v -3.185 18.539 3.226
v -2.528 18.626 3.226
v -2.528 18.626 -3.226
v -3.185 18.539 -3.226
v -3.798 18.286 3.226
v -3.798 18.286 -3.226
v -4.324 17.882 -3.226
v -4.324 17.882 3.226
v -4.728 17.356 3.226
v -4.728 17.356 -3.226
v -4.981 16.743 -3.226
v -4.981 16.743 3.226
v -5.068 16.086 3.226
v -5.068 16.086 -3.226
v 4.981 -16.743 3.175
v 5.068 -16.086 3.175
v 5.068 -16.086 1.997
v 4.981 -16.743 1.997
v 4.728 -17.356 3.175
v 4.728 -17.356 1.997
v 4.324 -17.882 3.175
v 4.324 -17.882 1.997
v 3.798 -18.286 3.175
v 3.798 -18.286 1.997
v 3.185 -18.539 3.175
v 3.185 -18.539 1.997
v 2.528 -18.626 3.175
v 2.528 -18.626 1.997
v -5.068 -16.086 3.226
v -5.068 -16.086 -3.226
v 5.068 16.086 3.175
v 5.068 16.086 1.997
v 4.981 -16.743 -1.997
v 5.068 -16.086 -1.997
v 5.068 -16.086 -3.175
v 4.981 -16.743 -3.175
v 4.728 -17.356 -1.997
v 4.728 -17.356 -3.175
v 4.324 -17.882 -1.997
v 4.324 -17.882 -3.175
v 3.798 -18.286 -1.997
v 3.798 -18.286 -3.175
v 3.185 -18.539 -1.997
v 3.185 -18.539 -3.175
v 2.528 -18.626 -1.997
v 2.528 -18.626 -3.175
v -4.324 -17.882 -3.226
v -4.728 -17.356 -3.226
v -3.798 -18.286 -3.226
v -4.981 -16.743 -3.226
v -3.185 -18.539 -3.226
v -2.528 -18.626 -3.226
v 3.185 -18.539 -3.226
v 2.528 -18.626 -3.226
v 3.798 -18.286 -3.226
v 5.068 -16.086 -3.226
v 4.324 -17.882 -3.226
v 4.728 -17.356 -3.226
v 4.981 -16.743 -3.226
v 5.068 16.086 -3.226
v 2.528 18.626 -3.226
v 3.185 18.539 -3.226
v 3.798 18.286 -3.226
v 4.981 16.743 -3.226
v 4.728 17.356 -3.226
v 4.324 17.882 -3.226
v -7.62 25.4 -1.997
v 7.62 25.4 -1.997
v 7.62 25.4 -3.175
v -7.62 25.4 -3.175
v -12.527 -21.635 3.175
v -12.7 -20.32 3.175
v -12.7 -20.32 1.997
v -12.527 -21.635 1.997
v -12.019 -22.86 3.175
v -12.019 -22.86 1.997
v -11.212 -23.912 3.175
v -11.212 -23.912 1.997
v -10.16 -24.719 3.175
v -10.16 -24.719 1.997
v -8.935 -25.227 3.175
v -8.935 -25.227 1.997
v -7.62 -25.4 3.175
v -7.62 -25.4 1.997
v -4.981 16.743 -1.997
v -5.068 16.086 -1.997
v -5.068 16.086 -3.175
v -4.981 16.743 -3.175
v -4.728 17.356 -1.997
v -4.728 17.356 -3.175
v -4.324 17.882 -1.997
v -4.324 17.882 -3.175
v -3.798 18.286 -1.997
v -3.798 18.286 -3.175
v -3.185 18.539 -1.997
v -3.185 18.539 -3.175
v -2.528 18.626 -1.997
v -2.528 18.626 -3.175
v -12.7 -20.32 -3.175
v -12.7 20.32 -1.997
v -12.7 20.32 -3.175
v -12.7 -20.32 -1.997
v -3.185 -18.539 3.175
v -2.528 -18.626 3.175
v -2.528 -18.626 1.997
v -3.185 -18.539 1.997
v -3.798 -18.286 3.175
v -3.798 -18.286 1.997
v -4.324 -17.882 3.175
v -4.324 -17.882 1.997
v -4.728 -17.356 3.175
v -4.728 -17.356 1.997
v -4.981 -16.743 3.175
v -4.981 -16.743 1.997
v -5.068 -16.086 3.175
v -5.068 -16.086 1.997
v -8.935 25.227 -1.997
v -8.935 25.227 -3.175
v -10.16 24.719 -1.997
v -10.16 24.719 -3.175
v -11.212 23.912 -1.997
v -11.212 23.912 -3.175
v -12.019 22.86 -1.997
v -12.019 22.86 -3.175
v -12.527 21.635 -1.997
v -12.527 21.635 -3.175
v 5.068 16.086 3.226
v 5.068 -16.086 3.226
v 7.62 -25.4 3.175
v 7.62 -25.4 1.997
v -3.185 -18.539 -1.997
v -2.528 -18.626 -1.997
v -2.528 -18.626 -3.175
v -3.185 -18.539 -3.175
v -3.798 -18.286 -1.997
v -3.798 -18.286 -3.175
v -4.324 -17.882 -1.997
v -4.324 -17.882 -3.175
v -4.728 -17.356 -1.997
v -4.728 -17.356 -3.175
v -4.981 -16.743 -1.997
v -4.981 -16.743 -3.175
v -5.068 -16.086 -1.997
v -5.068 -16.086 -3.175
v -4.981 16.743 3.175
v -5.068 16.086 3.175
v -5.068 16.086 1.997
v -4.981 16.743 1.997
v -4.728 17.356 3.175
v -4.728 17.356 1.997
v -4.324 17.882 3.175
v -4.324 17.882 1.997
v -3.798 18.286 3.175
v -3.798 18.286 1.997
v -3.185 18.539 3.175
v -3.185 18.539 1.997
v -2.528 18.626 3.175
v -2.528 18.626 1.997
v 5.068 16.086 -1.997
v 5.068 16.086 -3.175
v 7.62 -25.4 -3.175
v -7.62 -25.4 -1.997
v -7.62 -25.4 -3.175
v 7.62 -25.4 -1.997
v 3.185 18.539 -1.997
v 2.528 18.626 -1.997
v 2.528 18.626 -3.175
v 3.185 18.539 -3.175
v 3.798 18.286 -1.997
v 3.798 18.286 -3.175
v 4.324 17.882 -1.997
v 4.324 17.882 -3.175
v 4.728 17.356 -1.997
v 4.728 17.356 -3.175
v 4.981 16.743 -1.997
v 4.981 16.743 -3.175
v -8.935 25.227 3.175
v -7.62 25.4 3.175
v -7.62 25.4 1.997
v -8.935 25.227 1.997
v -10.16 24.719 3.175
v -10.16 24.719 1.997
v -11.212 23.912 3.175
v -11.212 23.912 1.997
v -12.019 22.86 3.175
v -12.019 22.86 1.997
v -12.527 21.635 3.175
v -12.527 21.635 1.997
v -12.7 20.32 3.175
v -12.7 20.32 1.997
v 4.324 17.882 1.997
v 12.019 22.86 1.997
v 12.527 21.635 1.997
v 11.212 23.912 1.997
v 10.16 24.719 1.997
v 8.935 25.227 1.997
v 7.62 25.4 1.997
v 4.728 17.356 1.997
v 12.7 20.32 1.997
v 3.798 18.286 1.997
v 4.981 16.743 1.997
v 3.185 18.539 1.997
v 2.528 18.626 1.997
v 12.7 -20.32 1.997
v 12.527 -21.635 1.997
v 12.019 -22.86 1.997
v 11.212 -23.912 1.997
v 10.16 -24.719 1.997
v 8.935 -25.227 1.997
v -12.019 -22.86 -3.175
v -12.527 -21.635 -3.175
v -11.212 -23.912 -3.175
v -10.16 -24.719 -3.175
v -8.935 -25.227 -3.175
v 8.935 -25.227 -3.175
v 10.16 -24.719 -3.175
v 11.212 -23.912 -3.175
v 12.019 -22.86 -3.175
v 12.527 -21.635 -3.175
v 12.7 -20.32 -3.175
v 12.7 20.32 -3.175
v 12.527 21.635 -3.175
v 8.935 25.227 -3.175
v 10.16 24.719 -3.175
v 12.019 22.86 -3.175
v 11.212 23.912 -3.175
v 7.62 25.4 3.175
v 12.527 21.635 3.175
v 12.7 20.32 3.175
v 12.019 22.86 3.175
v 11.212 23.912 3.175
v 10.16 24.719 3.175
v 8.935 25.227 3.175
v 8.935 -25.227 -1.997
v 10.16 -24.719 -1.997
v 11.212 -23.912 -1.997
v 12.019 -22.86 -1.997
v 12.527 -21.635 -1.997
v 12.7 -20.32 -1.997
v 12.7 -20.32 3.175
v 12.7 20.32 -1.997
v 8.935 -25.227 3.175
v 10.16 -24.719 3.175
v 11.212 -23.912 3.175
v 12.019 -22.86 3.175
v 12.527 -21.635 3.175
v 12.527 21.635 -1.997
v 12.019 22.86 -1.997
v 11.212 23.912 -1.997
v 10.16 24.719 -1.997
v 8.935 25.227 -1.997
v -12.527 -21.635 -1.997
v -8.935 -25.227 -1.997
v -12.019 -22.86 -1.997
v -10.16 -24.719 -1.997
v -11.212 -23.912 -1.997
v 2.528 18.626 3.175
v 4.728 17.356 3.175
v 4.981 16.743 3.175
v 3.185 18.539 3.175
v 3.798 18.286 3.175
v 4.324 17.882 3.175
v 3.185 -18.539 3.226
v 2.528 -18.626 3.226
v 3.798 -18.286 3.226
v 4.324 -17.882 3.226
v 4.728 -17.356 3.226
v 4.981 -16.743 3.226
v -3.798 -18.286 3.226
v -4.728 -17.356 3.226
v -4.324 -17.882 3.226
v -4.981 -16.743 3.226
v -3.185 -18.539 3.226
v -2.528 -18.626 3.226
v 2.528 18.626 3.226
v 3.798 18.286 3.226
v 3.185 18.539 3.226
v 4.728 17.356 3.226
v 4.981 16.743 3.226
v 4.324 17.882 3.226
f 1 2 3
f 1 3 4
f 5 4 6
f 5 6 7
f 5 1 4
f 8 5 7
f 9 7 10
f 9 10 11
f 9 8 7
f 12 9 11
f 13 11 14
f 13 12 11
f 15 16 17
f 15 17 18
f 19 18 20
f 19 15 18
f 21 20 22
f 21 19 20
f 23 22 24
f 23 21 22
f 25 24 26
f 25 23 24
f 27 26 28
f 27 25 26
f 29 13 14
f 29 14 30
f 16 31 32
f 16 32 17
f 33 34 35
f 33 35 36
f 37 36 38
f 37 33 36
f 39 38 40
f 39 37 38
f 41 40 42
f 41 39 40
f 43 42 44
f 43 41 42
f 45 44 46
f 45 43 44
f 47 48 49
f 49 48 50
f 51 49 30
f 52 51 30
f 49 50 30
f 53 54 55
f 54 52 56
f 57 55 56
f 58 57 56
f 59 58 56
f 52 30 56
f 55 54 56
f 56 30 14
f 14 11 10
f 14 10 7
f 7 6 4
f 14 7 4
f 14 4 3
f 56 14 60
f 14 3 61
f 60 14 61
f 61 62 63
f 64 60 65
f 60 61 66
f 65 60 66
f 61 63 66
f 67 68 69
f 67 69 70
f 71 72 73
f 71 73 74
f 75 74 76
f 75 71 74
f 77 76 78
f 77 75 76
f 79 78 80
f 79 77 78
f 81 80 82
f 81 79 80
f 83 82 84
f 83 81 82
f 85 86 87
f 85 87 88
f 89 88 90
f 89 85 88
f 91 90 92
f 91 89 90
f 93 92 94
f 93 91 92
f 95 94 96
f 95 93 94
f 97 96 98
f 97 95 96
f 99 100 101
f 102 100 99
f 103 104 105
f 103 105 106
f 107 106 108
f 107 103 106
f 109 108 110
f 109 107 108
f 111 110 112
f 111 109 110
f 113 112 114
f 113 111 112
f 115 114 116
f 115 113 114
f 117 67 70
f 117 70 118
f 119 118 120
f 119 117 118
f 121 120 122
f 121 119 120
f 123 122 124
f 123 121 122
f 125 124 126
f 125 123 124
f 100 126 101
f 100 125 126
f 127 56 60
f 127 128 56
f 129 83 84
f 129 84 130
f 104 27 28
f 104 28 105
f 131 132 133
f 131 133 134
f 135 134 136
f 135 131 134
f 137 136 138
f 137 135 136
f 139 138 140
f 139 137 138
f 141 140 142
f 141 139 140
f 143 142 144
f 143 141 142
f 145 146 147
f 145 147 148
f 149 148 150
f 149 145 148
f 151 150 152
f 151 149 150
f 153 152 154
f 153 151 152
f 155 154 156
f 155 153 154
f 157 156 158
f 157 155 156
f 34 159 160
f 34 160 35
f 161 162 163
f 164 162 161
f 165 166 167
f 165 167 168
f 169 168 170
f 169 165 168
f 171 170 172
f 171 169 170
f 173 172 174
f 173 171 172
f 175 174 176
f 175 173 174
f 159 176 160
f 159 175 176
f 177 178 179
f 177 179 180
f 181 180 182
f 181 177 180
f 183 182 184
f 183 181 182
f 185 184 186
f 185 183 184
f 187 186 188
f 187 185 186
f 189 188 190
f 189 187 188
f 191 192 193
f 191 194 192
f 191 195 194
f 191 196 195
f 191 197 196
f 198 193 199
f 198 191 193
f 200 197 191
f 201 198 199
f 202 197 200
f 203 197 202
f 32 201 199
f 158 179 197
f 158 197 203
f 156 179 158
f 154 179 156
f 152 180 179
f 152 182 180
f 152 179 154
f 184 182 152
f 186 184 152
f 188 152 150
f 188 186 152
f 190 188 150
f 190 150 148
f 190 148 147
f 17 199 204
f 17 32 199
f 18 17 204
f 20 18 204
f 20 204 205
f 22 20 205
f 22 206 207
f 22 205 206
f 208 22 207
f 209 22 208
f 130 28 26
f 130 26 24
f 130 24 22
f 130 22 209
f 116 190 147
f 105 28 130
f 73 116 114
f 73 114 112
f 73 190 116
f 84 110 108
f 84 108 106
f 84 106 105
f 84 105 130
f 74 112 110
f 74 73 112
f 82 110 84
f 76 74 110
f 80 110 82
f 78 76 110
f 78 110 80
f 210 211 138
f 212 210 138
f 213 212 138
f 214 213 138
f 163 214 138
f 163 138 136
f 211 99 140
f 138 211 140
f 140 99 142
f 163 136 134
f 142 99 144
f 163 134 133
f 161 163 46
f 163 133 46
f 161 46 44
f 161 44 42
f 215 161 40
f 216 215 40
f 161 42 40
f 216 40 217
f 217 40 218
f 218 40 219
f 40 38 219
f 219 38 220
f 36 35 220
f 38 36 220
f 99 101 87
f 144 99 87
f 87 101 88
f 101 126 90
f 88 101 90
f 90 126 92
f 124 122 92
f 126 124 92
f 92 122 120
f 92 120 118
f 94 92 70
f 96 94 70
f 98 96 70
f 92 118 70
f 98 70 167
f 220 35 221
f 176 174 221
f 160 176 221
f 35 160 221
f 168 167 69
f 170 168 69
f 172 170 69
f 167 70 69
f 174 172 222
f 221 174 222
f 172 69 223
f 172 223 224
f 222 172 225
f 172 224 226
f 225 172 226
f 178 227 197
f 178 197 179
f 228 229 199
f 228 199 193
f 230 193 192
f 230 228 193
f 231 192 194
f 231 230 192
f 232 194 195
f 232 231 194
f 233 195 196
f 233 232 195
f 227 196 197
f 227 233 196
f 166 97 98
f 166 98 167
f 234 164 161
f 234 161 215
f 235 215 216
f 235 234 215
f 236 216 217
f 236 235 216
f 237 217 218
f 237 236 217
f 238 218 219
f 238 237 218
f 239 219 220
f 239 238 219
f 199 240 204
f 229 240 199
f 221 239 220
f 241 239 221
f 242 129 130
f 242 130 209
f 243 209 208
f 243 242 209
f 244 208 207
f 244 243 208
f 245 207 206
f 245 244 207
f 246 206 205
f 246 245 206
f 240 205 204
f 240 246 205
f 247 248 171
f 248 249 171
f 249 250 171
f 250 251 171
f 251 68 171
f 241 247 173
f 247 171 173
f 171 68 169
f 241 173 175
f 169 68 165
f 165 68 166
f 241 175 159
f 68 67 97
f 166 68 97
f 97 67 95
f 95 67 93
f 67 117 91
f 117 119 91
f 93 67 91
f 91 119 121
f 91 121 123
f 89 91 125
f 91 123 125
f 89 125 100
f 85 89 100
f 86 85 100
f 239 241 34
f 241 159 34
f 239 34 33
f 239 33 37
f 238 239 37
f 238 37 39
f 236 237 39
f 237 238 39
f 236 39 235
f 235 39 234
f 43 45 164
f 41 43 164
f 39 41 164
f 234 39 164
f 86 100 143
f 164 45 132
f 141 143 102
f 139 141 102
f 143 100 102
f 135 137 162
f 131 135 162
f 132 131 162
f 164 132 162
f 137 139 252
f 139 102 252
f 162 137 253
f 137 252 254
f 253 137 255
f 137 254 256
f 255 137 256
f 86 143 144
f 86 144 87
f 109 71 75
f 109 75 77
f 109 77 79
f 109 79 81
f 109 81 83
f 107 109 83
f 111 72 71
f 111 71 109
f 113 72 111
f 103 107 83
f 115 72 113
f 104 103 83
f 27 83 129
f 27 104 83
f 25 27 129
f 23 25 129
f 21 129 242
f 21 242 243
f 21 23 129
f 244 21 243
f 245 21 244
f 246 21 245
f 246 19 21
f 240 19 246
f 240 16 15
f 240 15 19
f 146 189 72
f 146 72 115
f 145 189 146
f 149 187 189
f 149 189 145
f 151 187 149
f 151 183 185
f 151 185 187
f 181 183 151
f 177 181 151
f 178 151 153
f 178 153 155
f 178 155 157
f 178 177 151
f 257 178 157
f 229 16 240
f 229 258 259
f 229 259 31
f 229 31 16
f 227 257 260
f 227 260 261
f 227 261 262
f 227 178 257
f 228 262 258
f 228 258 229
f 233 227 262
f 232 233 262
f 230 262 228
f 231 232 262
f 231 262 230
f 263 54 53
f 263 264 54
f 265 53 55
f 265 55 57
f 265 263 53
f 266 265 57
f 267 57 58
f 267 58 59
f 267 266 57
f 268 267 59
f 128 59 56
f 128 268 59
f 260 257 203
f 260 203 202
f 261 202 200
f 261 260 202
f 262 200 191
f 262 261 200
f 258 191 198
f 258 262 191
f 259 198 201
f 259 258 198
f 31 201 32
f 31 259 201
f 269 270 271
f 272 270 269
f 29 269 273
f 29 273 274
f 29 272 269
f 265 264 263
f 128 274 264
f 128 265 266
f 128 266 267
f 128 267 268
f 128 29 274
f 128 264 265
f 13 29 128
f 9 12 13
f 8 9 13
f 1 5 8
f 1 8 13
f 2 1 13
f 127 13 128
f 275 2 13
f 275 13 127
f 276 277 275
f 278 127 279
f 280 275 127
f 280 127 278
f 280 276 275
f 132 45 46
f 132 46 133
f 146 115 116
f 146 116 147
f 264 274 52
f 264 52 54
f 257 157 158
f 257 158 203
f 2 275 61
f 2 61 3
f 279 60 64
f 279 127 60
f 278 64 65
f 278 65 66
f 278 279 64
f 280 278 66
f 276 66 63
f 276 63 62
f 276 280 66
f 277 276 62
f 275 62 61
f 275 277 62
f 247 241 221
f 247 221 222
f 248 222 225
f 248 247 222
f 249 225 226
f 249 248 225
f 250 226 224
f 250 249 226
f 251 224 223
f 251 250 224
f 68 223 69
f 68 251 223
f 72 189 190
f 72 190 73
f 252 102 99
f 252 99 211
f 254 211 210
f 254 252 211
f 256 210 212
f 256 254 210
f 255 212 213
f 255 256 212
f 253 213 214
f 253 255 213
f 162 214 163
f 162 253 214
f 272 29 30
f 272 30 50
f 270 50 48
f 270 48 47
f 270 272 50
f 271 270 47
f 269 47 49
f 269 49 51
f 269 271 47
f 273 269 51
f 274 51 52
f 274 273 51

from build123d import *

# Parameters (mm, degrees)
F1_DEPTH = 3.175
F2_W     = 55.1815740764
F2_H     = 3.9936336689
F3_DEPTH = 25.4
F4_DEPTH = 3.2258


with BuildPart() as f1:
    # F0 (on Top) → F1 (new body, symmetric)
    with BuildSketch(Plane.XY):
        with BuildLine():
            ThreePointArc((12.7, 20.32), (11.2121024484, 23.9121024484), (7.62, 25.4))
            Line((7.62, 25.4), (-7.62, 25.4))
            ThreePointArc((-7.62, 25.4), (-11.2121024484, 23.9121024484), (-12.7, 20.32))
            Line((-12.7, 20.32), (-12.7, -20.32))
            ThreePointArc((-12.7, -20.32), (-11.2121024484, -23.9121024484), (-7.62, -25.4))
            Line((-7.62, -25.4), (7.62, -25.4))
            ThreePointArc((7.62, -25.4), (11.2121024484, -23.9121024484), (12.7, -20.32))
            Line((12.7, -20.32), (12.7, 20.32))
        make_face()
        with BuildLine():
            Line((-2.5279878332, 18.6258405447), (2.5279878332, 18.6258405447))
            ThreePointArc((2.5279878332, 18.6258405447), (4.3240390574, 17.8818917689), (5.0679878332, 16.0858405447))
            Line((5.0679878332, 16.0858405447), (5.0679878332, -16.0858405447))
            ThreePointArc((5.0679878332, -16.0858405447), (4.3240390574, -17.8818917689), (2.5279878332, -18.6258405447))
            Line((2.5279878332, -18.6258405447), (-2.5279878332, -18.6258405447))
            ThreePointArc((-2.5279878332, -18.6258405447), (-4.3240390574, -17.8818917689), (-5.0679878332, -16.0858405447))
            Line((-5.0679878332, -16.0858405447), (-5.0679878332, 16.0858405447))
            ThreePointArc((-5.0679878332, 16.0858405447), (-4.3240390574, 17.8818917689), (-2.5279878332, 18.6258405447))
        make_face(mode=Mode.SUBTRACT)
    extrude(amount=F1_DEPTH, both=True)

    # F2 (on face) → F3 (cut)
    with BuildSketch(Plane(origin=(-12.7, 0, 0), x_dir=(0, -1, 0), z_dir=(-1, 0, 0))):
        Rectangle(F2_W, F2_H)
    extrude(amount=-F3_DEPTH, mode=Mode.SUBTRACT)


with BuildPart() as f4:
    # F0 (on Top) → F4 (new body, symmetric)
    with BuildSketch(Plane.XY):
        with BuildLine():
            ThreePointArc((5.0679878332, 16.0858405447), (4.3240390574, 17.8818917689), (2.5279878332, 18.6258405447))
            Line((2.5279878332, 18.6258405447), (-2.5279878332, 18.6258405447))
            ThreePointArc((-2.5279878332, 18.6258405447), (-4.3240390574, 17.8818917689), (-5.0679878332, 16.0858405447))
            Line((-5.0679878332, 16.0858405447), (-5.0679878332, -16.0858405447))
            ThreePointArc((-5.0679878332, -16.0858405447), (-4.3240390574, -17.8818917689), (-2.5279878332, -18.6258405447))
            Line((-2.5279878332, -18.6258405447), (2.5279878332, -18.6258405447))
            ThreePointArc((2.5279878332, -18.6258405447), (4.3240390574, -17.8818917689), (5.0679878332, -16.0858405447))
            Line((5.0679878332, -16.0858405447), (5.0679878332, 16.0858405447))
        make_face()
    extrude(amount=F4_DEPTH, both=True)


solid = Compound([f1.part, f4.part])
